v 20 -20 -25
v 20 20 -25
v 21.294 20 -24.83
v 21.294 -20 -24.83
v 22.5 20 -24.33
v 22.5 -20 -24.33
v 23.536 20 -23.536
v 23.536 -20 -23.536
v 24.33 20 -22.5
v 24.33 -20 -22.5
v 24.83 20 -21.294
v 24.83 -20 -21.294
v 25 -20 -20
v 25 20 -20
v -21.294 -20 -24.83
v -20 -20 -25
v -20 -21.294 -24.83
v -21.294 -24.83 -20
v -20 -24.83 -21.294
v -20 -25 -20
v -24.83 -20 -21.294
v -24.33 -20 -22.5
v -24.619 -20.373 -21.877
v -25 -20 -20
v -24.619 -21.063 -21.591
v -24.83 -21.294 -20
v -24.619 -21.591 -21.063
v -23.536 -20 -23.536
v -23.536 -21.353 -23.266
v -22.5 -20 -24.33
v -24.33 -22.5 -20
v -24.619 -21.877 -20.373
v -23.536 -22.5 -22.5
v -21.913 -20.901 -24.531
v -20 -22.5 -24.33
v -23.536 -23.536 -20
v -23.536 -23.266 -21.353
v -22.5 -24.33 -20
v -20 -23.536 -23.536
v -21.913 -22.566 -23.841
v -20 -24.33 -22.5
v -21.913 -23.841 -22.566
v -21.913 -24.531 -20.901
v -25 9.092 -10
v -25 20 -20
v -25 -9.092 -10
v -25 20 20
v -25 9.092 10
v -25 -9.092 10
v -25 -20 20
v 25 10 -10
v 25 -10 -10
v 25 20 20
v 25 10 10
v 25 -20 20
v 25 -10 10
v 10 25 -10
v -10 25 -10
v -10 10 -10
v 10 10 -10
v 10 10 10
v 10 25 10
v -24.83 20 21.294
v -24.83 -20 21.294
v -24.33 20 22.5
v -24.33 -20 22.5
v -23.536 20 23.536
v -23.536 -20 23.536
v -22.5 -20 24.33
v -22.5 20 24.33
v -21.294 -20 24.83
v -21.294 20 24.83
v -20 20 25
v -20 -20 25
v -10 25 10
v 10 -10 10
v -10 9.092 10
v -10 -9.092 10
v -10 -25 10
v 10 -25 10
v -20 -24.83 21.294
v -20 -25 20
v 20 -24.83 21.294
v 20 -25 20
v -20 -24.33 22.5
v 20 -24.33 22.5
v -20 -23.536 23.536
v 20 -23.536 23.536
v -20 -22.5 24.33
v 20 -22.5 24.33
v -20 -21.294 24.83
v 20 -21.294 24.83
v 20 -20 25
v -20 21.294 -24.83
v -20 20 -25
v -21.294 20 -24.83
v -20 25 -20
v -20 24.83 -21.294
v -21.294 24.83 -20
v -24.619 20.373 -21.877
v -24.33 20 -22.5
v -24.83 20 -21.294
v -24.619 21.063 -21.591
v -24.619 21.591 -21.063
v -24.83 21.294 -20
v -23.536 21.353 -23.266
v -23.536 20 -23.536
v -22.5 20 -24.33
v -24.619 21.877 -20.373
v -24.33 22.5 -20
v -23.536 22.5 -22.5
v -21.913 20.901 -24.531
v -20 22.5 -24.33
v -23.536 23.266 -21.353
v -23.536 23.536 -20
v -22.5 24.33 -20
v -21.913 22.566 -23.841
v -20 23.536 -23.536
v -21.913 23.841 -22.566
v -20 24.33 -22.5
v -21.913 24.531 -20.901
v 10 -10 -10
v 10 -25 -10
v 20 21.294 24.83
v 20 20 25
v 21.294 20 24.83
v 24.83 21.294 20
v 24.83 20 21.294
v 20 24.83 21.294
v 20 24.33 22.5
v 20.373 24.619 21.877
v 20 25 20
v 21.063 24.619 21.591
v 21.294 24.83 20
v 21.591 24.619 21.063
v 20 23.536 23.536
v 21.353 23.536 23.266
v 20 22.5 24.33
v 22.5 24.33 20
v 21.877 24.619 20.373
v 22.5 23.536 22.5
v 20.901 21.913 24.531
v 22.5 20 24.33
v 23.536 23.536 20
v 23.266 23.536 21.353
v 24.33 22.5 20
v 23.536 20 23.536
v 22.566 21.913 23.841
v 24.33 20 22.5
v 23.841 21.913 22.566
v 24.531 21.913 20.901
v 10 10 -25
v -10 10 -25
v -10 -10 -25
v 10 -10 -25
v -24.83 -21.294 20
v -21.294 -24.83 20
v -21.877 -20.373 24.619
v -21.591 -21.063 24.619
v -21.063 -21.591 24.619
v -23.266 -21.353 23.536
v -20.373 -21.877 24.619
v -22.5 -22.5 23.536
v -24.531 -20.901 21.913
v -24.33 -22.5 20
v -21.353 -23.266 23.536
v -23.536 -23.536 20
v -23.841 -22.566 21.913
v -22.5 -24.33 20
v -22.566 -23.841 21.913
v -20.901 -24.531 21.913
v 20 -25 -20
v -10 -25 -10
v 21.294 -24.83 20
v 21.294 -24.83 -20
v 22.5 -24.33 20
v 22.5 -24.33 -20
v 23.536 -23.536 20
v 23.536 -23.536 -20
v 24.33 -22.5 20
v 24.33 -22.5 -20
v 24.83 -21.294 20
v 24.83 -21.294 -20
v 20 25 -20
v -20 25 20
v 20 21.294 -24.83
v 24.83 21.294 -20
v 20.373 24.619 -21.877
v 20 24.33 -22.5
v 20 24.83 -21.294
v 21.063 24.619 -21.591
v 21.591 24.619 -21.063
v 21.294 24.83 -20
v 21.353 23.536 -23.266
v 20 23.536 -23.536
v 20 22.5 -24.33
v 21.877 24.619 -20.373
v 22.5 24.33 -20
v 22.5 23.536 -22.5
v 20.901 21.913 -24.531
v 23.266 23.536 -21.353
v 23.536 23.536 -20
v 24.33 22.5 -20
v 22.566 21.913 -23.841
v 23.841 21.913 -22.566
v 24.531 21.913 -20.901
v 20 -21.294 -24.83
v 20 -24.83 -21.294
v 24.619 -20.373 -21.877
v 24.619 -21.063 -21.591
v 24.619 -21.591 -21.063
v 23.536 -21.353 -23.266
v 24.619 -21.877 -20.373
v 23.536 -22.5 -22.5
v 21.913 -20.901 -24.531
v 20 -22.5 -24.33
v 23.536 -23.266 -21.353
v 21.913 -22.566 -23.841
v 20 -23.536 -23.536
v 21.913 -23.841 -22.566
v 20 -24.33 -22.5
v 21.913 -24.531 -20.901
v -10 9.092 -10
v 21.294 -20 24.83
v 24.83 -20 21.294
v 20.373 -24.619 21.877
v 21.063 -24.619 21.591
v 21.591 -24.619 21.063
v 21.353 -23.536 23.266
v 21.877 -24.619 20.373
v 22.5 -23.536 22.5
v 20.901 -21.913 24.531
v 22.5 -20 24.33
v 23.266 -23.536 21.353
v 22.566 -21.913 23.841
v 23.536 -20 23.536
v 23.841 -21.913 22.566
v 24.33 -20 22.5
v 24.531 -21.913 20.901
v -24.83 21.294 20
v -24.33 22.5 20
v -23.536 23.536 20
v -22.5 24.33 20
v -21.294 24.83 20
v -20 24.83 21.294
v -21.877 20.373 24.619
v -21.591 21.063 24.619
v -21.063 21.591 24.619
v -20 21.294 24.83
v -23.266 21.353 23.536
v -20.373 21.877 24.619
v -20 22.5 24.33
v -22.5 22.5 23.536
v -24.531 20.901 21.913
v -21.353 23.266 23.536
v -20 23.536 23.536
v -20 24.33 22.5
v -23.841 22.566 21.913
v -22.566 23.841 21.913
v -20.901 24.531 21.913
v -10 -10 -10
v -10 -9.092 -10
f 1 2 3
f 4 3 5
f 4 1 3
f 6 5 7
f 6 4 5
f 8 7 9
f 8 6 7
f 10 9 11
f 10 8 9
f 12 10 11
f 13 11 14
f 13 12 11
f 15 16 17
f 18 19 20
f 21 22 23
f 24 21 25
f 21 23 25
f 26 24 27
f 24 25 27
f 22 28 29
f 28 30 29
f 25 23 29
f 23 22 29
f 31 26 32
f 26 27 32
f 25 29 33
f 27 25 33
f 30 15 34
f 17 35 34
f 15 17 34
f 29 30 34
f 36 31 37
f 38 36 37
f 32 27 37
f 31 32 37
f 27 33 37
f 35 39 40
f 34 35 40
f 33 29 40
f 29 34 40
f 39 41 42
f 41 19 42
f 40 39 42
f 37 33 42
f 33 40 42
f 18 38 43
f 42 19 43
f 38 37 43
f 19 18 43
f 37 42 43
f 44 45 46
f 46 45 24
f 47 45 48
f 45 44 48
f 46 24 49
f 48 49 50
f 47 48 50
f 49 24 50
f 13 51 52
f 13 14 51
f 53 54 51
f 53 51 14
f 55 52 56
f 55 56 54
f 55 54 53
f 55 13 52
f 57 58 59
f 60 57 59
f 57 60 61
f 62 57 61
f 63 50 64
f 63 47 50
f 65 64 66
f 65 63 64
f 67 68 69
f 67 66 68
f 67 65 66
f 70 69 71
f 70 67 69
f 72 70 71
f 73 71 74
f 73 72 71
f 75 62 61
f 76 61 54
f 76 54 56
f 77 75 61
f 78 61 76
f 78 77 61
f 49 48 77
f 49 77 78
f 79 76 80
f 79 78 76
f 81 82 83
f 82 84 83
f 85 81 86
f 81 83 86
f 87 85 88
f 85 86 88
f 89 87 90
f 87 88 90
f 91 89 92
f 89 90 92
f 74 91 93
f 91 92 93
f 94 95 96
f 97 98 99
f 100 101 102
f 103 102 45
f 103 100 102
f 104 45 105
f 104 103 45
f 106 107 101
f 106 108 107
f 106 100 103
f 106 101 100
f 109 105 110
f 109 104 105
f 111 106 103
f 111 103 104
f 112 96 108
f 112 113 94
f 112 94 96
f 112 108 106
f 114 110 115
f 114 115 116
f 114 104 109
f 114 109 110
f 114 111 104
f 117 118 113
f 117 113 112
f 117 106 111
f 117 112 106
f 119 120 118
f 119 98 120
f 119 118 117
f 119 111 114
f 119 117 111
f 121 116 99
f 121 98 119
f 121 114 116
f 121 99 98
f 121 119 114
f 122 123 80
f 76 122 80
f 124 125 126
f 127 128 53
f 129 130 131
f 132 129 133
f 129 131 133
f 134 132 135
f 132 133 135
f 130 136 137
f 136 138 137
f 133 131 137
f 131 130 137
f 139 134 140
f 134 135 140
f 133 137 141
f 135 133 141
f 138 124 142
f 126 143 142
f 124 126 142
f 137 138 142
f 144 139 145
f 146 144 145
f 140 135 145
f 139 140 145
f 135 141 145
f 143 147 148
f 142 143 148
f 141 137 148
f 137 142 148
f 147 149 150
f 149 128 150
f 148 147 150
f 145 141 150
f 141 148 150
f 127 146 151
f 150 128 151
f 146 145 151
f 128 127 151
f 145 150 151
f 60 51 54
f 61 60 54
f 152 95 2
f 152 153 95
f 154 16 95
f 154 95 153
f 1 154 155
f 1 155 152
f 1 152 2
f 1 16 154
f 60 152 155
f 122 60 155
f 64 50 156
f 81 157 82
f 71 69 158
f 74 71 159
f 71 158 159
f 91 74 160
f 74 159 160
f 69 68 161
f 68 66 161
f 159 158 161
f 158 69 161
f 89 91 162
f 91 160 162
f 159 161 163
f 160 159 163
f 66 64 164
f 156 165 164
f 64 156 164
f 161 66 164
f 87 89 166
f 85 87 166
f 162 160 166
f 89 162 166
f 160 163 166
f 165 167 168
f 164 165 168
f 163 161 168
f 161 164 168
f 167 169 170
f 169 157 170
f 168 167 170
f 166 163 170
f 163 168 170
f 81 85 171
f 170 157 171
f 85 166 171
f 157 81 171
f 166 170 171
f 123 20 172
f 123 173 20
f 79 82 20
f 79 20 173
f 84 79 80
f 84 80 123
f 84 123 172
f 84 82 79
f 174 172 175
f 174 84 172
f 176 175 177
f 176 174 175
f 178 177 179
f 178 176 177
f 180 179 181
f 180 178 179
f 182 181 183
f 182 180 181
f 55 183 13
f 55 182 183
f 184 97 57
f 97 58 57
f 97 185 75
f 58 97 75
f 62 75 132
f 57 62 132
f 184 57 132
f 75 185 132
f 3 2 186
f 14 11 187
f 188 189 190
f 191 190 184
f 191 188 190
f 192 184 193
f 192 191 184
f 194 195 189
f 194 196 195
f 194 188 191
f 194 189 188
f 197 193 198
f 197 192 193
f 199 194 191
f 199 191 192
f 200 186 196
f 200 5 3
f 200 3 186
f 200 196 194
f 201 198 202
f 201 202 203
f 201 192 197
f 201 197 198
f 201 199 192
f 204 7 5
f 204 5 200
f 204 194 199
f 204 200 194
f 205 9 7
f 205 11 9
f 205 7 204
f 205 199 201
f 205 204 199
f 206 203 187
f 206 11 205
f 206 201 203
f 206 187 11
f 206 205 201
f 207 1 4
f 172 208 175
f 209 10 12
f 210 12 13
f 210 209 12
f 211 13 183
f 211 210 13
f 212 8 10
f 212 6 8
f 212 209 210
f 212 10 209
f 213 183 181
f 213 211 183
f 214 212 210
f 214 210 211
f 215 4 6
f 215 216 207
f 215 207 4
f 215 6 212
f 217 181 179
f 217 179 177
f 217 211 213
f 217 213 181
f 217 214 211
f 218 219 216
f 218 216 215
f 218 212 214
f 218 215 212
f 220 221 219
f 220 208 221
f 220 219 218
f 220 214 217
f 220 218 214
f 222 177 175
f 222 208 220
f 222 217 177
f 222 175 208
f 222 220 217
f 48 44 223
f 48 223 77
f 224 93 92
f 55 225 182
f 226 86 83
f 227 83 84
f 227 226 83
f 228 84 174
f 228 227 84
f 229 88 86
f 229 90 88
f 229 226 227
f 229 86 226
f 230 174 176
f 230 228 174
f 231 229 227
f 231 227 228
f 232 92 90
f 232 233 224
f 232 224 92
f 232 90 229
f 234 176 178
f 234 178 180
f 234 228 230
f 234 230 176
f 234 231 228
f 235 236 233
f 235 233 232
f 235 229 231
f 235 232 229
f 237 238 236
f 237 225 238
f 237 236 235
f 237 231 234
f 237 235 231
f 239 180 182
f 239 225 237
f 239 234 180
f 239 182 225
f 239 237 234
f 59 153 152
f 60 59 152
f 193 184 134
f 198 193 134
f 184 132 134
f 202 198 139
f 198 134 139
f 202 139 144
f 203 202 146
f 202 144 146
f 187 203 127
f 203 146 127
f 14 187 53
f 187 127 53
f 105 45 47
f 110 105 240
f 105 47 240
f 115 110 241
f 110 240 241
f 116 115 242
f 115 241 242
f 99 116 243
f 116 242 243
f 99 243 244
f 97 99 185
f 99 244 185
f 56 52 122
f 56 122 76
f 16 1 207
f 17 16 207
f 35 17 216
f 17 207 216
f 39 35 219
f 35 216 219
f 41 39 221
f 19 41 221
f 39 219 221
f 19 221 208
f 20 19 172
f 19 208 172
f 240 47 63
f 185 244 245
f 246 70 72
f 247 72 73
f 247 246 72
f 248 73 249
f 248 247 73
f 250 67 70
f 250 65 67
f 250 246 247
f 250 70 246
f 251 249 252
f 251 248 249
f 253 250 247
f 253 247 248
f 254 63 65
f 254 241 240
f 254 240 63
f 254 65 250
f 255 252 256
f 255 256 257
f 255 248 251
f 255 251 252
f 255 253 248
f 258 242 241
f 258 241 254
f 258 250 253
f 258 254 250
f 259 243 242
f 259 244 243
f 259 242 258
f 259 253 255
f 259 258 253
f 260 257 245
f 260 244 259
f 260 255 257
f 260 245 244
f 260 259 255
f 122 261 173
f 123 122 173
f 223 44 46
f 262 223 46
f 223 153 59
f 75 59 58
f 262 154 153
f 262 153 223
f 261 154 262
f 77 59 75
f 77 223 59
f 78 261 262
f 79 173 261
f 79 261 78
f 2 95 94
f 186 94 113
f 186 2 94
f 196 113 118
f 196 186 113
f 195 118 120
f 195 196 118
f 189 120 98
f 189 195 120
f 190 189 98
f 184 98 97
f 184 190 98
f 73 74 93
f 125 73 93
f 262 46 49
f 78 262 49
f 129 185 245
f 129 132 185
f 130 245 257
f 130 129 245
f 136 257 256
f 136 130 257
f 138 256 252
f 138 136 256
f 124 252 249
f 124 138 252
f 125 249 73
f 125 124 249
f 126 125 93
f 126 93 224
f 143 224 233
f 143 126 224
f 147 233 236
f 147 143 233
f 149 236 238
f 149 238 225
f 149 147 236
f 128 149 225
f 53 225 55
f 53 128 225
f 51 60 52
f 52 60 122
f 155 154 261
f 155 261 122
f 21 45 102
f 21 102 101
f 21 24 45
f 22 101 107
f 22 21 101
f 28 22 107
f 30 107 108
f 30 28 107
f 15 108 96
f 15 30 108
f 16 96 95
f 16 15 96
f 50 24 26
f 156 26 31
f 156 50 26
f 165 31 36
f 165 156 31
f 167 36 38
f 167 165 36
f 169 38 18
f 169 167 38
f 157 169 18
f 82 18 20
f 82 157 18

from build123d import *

# Parameters (mm, degrees)
F0_W      = 50
F0_H      = 50
F1_DEPTH  = 25
F2_W      = 20
F2_H      = 20
F3_DEPTH  = 50
F4_W      = 20
F4_H      = 20
F5_DEPTH  = 15
F6_W      = 18.1838367134
F6_H      = 20
F7_DEPTH  = 15
F8_R      = 5
F9_W      = 20
F9_H      = 20
F10_DEPTH = 15


with BuildPart() as f1:
    # F0 (on Front) → F1 (new body, symmetric)
    with BuildSketch(Plane.XZ):
        Rectangle(F0_W, F0_H)
    extrude(amount=F1_DEPTH, both=True)

    # F2 (on face) → F3 (cut, through all)
    with BuildSketch(Plane.XZ.offset(25)):
        Rectangle(F2_W, F2_H)
    extrude(amount=-F3_DEPTH, mode=Mode.SUBTRACT)

    # F4 (on face) → F5 (cut, through all)
    with BuildSketch(Plane.YZ.offset(25)):
        Rectangle(F4_W, F4_H)
    extrude(amount=-F5_DEPTH, mode=Mode.SUBTRACT)

    # F6 (on face) → F7 (cut, through all)
    with BuildSketch(Plane(origin=(-25, 0, 0), x_dir=(0, -1, 0), z_dir=(-1, 0, 0))):
        Rectangle(F6_W, F6_H)
    extrude(amount=-F7_DEPTH, mode=Mode.SUBTRACT)

    # F8
    f8_edges = [f1.edges().sort_by_distance(p)[0] for p in [
        (0, -25, -25),
        (25, 0, -25),
        (0, 25, -25),
        (-25, 0, -25),
        (-25, -25, 0),
        (-25, 25, 0),
        (-25, 0, 25),
        (25, 0, 25),
        (0, 25, 25),
        (0, -25, 25),
        (25, -25, 0),
        (25, 25, 0),
    ]]
    fillet(f8_edges, radius=F8_R)

    # F9 (on face) → F10 (cut, through all)
    with BuildSketch(Plane(origin=(0, 0, -25), x_dir=(1, 0, 0), z_dir=(0, 0, -1))):
        Rectangle(F9_W, F9_H)
    extrude(amount=-F10_DEPTH, mode=Mode.SUBTRACT)


solid = f1.part
